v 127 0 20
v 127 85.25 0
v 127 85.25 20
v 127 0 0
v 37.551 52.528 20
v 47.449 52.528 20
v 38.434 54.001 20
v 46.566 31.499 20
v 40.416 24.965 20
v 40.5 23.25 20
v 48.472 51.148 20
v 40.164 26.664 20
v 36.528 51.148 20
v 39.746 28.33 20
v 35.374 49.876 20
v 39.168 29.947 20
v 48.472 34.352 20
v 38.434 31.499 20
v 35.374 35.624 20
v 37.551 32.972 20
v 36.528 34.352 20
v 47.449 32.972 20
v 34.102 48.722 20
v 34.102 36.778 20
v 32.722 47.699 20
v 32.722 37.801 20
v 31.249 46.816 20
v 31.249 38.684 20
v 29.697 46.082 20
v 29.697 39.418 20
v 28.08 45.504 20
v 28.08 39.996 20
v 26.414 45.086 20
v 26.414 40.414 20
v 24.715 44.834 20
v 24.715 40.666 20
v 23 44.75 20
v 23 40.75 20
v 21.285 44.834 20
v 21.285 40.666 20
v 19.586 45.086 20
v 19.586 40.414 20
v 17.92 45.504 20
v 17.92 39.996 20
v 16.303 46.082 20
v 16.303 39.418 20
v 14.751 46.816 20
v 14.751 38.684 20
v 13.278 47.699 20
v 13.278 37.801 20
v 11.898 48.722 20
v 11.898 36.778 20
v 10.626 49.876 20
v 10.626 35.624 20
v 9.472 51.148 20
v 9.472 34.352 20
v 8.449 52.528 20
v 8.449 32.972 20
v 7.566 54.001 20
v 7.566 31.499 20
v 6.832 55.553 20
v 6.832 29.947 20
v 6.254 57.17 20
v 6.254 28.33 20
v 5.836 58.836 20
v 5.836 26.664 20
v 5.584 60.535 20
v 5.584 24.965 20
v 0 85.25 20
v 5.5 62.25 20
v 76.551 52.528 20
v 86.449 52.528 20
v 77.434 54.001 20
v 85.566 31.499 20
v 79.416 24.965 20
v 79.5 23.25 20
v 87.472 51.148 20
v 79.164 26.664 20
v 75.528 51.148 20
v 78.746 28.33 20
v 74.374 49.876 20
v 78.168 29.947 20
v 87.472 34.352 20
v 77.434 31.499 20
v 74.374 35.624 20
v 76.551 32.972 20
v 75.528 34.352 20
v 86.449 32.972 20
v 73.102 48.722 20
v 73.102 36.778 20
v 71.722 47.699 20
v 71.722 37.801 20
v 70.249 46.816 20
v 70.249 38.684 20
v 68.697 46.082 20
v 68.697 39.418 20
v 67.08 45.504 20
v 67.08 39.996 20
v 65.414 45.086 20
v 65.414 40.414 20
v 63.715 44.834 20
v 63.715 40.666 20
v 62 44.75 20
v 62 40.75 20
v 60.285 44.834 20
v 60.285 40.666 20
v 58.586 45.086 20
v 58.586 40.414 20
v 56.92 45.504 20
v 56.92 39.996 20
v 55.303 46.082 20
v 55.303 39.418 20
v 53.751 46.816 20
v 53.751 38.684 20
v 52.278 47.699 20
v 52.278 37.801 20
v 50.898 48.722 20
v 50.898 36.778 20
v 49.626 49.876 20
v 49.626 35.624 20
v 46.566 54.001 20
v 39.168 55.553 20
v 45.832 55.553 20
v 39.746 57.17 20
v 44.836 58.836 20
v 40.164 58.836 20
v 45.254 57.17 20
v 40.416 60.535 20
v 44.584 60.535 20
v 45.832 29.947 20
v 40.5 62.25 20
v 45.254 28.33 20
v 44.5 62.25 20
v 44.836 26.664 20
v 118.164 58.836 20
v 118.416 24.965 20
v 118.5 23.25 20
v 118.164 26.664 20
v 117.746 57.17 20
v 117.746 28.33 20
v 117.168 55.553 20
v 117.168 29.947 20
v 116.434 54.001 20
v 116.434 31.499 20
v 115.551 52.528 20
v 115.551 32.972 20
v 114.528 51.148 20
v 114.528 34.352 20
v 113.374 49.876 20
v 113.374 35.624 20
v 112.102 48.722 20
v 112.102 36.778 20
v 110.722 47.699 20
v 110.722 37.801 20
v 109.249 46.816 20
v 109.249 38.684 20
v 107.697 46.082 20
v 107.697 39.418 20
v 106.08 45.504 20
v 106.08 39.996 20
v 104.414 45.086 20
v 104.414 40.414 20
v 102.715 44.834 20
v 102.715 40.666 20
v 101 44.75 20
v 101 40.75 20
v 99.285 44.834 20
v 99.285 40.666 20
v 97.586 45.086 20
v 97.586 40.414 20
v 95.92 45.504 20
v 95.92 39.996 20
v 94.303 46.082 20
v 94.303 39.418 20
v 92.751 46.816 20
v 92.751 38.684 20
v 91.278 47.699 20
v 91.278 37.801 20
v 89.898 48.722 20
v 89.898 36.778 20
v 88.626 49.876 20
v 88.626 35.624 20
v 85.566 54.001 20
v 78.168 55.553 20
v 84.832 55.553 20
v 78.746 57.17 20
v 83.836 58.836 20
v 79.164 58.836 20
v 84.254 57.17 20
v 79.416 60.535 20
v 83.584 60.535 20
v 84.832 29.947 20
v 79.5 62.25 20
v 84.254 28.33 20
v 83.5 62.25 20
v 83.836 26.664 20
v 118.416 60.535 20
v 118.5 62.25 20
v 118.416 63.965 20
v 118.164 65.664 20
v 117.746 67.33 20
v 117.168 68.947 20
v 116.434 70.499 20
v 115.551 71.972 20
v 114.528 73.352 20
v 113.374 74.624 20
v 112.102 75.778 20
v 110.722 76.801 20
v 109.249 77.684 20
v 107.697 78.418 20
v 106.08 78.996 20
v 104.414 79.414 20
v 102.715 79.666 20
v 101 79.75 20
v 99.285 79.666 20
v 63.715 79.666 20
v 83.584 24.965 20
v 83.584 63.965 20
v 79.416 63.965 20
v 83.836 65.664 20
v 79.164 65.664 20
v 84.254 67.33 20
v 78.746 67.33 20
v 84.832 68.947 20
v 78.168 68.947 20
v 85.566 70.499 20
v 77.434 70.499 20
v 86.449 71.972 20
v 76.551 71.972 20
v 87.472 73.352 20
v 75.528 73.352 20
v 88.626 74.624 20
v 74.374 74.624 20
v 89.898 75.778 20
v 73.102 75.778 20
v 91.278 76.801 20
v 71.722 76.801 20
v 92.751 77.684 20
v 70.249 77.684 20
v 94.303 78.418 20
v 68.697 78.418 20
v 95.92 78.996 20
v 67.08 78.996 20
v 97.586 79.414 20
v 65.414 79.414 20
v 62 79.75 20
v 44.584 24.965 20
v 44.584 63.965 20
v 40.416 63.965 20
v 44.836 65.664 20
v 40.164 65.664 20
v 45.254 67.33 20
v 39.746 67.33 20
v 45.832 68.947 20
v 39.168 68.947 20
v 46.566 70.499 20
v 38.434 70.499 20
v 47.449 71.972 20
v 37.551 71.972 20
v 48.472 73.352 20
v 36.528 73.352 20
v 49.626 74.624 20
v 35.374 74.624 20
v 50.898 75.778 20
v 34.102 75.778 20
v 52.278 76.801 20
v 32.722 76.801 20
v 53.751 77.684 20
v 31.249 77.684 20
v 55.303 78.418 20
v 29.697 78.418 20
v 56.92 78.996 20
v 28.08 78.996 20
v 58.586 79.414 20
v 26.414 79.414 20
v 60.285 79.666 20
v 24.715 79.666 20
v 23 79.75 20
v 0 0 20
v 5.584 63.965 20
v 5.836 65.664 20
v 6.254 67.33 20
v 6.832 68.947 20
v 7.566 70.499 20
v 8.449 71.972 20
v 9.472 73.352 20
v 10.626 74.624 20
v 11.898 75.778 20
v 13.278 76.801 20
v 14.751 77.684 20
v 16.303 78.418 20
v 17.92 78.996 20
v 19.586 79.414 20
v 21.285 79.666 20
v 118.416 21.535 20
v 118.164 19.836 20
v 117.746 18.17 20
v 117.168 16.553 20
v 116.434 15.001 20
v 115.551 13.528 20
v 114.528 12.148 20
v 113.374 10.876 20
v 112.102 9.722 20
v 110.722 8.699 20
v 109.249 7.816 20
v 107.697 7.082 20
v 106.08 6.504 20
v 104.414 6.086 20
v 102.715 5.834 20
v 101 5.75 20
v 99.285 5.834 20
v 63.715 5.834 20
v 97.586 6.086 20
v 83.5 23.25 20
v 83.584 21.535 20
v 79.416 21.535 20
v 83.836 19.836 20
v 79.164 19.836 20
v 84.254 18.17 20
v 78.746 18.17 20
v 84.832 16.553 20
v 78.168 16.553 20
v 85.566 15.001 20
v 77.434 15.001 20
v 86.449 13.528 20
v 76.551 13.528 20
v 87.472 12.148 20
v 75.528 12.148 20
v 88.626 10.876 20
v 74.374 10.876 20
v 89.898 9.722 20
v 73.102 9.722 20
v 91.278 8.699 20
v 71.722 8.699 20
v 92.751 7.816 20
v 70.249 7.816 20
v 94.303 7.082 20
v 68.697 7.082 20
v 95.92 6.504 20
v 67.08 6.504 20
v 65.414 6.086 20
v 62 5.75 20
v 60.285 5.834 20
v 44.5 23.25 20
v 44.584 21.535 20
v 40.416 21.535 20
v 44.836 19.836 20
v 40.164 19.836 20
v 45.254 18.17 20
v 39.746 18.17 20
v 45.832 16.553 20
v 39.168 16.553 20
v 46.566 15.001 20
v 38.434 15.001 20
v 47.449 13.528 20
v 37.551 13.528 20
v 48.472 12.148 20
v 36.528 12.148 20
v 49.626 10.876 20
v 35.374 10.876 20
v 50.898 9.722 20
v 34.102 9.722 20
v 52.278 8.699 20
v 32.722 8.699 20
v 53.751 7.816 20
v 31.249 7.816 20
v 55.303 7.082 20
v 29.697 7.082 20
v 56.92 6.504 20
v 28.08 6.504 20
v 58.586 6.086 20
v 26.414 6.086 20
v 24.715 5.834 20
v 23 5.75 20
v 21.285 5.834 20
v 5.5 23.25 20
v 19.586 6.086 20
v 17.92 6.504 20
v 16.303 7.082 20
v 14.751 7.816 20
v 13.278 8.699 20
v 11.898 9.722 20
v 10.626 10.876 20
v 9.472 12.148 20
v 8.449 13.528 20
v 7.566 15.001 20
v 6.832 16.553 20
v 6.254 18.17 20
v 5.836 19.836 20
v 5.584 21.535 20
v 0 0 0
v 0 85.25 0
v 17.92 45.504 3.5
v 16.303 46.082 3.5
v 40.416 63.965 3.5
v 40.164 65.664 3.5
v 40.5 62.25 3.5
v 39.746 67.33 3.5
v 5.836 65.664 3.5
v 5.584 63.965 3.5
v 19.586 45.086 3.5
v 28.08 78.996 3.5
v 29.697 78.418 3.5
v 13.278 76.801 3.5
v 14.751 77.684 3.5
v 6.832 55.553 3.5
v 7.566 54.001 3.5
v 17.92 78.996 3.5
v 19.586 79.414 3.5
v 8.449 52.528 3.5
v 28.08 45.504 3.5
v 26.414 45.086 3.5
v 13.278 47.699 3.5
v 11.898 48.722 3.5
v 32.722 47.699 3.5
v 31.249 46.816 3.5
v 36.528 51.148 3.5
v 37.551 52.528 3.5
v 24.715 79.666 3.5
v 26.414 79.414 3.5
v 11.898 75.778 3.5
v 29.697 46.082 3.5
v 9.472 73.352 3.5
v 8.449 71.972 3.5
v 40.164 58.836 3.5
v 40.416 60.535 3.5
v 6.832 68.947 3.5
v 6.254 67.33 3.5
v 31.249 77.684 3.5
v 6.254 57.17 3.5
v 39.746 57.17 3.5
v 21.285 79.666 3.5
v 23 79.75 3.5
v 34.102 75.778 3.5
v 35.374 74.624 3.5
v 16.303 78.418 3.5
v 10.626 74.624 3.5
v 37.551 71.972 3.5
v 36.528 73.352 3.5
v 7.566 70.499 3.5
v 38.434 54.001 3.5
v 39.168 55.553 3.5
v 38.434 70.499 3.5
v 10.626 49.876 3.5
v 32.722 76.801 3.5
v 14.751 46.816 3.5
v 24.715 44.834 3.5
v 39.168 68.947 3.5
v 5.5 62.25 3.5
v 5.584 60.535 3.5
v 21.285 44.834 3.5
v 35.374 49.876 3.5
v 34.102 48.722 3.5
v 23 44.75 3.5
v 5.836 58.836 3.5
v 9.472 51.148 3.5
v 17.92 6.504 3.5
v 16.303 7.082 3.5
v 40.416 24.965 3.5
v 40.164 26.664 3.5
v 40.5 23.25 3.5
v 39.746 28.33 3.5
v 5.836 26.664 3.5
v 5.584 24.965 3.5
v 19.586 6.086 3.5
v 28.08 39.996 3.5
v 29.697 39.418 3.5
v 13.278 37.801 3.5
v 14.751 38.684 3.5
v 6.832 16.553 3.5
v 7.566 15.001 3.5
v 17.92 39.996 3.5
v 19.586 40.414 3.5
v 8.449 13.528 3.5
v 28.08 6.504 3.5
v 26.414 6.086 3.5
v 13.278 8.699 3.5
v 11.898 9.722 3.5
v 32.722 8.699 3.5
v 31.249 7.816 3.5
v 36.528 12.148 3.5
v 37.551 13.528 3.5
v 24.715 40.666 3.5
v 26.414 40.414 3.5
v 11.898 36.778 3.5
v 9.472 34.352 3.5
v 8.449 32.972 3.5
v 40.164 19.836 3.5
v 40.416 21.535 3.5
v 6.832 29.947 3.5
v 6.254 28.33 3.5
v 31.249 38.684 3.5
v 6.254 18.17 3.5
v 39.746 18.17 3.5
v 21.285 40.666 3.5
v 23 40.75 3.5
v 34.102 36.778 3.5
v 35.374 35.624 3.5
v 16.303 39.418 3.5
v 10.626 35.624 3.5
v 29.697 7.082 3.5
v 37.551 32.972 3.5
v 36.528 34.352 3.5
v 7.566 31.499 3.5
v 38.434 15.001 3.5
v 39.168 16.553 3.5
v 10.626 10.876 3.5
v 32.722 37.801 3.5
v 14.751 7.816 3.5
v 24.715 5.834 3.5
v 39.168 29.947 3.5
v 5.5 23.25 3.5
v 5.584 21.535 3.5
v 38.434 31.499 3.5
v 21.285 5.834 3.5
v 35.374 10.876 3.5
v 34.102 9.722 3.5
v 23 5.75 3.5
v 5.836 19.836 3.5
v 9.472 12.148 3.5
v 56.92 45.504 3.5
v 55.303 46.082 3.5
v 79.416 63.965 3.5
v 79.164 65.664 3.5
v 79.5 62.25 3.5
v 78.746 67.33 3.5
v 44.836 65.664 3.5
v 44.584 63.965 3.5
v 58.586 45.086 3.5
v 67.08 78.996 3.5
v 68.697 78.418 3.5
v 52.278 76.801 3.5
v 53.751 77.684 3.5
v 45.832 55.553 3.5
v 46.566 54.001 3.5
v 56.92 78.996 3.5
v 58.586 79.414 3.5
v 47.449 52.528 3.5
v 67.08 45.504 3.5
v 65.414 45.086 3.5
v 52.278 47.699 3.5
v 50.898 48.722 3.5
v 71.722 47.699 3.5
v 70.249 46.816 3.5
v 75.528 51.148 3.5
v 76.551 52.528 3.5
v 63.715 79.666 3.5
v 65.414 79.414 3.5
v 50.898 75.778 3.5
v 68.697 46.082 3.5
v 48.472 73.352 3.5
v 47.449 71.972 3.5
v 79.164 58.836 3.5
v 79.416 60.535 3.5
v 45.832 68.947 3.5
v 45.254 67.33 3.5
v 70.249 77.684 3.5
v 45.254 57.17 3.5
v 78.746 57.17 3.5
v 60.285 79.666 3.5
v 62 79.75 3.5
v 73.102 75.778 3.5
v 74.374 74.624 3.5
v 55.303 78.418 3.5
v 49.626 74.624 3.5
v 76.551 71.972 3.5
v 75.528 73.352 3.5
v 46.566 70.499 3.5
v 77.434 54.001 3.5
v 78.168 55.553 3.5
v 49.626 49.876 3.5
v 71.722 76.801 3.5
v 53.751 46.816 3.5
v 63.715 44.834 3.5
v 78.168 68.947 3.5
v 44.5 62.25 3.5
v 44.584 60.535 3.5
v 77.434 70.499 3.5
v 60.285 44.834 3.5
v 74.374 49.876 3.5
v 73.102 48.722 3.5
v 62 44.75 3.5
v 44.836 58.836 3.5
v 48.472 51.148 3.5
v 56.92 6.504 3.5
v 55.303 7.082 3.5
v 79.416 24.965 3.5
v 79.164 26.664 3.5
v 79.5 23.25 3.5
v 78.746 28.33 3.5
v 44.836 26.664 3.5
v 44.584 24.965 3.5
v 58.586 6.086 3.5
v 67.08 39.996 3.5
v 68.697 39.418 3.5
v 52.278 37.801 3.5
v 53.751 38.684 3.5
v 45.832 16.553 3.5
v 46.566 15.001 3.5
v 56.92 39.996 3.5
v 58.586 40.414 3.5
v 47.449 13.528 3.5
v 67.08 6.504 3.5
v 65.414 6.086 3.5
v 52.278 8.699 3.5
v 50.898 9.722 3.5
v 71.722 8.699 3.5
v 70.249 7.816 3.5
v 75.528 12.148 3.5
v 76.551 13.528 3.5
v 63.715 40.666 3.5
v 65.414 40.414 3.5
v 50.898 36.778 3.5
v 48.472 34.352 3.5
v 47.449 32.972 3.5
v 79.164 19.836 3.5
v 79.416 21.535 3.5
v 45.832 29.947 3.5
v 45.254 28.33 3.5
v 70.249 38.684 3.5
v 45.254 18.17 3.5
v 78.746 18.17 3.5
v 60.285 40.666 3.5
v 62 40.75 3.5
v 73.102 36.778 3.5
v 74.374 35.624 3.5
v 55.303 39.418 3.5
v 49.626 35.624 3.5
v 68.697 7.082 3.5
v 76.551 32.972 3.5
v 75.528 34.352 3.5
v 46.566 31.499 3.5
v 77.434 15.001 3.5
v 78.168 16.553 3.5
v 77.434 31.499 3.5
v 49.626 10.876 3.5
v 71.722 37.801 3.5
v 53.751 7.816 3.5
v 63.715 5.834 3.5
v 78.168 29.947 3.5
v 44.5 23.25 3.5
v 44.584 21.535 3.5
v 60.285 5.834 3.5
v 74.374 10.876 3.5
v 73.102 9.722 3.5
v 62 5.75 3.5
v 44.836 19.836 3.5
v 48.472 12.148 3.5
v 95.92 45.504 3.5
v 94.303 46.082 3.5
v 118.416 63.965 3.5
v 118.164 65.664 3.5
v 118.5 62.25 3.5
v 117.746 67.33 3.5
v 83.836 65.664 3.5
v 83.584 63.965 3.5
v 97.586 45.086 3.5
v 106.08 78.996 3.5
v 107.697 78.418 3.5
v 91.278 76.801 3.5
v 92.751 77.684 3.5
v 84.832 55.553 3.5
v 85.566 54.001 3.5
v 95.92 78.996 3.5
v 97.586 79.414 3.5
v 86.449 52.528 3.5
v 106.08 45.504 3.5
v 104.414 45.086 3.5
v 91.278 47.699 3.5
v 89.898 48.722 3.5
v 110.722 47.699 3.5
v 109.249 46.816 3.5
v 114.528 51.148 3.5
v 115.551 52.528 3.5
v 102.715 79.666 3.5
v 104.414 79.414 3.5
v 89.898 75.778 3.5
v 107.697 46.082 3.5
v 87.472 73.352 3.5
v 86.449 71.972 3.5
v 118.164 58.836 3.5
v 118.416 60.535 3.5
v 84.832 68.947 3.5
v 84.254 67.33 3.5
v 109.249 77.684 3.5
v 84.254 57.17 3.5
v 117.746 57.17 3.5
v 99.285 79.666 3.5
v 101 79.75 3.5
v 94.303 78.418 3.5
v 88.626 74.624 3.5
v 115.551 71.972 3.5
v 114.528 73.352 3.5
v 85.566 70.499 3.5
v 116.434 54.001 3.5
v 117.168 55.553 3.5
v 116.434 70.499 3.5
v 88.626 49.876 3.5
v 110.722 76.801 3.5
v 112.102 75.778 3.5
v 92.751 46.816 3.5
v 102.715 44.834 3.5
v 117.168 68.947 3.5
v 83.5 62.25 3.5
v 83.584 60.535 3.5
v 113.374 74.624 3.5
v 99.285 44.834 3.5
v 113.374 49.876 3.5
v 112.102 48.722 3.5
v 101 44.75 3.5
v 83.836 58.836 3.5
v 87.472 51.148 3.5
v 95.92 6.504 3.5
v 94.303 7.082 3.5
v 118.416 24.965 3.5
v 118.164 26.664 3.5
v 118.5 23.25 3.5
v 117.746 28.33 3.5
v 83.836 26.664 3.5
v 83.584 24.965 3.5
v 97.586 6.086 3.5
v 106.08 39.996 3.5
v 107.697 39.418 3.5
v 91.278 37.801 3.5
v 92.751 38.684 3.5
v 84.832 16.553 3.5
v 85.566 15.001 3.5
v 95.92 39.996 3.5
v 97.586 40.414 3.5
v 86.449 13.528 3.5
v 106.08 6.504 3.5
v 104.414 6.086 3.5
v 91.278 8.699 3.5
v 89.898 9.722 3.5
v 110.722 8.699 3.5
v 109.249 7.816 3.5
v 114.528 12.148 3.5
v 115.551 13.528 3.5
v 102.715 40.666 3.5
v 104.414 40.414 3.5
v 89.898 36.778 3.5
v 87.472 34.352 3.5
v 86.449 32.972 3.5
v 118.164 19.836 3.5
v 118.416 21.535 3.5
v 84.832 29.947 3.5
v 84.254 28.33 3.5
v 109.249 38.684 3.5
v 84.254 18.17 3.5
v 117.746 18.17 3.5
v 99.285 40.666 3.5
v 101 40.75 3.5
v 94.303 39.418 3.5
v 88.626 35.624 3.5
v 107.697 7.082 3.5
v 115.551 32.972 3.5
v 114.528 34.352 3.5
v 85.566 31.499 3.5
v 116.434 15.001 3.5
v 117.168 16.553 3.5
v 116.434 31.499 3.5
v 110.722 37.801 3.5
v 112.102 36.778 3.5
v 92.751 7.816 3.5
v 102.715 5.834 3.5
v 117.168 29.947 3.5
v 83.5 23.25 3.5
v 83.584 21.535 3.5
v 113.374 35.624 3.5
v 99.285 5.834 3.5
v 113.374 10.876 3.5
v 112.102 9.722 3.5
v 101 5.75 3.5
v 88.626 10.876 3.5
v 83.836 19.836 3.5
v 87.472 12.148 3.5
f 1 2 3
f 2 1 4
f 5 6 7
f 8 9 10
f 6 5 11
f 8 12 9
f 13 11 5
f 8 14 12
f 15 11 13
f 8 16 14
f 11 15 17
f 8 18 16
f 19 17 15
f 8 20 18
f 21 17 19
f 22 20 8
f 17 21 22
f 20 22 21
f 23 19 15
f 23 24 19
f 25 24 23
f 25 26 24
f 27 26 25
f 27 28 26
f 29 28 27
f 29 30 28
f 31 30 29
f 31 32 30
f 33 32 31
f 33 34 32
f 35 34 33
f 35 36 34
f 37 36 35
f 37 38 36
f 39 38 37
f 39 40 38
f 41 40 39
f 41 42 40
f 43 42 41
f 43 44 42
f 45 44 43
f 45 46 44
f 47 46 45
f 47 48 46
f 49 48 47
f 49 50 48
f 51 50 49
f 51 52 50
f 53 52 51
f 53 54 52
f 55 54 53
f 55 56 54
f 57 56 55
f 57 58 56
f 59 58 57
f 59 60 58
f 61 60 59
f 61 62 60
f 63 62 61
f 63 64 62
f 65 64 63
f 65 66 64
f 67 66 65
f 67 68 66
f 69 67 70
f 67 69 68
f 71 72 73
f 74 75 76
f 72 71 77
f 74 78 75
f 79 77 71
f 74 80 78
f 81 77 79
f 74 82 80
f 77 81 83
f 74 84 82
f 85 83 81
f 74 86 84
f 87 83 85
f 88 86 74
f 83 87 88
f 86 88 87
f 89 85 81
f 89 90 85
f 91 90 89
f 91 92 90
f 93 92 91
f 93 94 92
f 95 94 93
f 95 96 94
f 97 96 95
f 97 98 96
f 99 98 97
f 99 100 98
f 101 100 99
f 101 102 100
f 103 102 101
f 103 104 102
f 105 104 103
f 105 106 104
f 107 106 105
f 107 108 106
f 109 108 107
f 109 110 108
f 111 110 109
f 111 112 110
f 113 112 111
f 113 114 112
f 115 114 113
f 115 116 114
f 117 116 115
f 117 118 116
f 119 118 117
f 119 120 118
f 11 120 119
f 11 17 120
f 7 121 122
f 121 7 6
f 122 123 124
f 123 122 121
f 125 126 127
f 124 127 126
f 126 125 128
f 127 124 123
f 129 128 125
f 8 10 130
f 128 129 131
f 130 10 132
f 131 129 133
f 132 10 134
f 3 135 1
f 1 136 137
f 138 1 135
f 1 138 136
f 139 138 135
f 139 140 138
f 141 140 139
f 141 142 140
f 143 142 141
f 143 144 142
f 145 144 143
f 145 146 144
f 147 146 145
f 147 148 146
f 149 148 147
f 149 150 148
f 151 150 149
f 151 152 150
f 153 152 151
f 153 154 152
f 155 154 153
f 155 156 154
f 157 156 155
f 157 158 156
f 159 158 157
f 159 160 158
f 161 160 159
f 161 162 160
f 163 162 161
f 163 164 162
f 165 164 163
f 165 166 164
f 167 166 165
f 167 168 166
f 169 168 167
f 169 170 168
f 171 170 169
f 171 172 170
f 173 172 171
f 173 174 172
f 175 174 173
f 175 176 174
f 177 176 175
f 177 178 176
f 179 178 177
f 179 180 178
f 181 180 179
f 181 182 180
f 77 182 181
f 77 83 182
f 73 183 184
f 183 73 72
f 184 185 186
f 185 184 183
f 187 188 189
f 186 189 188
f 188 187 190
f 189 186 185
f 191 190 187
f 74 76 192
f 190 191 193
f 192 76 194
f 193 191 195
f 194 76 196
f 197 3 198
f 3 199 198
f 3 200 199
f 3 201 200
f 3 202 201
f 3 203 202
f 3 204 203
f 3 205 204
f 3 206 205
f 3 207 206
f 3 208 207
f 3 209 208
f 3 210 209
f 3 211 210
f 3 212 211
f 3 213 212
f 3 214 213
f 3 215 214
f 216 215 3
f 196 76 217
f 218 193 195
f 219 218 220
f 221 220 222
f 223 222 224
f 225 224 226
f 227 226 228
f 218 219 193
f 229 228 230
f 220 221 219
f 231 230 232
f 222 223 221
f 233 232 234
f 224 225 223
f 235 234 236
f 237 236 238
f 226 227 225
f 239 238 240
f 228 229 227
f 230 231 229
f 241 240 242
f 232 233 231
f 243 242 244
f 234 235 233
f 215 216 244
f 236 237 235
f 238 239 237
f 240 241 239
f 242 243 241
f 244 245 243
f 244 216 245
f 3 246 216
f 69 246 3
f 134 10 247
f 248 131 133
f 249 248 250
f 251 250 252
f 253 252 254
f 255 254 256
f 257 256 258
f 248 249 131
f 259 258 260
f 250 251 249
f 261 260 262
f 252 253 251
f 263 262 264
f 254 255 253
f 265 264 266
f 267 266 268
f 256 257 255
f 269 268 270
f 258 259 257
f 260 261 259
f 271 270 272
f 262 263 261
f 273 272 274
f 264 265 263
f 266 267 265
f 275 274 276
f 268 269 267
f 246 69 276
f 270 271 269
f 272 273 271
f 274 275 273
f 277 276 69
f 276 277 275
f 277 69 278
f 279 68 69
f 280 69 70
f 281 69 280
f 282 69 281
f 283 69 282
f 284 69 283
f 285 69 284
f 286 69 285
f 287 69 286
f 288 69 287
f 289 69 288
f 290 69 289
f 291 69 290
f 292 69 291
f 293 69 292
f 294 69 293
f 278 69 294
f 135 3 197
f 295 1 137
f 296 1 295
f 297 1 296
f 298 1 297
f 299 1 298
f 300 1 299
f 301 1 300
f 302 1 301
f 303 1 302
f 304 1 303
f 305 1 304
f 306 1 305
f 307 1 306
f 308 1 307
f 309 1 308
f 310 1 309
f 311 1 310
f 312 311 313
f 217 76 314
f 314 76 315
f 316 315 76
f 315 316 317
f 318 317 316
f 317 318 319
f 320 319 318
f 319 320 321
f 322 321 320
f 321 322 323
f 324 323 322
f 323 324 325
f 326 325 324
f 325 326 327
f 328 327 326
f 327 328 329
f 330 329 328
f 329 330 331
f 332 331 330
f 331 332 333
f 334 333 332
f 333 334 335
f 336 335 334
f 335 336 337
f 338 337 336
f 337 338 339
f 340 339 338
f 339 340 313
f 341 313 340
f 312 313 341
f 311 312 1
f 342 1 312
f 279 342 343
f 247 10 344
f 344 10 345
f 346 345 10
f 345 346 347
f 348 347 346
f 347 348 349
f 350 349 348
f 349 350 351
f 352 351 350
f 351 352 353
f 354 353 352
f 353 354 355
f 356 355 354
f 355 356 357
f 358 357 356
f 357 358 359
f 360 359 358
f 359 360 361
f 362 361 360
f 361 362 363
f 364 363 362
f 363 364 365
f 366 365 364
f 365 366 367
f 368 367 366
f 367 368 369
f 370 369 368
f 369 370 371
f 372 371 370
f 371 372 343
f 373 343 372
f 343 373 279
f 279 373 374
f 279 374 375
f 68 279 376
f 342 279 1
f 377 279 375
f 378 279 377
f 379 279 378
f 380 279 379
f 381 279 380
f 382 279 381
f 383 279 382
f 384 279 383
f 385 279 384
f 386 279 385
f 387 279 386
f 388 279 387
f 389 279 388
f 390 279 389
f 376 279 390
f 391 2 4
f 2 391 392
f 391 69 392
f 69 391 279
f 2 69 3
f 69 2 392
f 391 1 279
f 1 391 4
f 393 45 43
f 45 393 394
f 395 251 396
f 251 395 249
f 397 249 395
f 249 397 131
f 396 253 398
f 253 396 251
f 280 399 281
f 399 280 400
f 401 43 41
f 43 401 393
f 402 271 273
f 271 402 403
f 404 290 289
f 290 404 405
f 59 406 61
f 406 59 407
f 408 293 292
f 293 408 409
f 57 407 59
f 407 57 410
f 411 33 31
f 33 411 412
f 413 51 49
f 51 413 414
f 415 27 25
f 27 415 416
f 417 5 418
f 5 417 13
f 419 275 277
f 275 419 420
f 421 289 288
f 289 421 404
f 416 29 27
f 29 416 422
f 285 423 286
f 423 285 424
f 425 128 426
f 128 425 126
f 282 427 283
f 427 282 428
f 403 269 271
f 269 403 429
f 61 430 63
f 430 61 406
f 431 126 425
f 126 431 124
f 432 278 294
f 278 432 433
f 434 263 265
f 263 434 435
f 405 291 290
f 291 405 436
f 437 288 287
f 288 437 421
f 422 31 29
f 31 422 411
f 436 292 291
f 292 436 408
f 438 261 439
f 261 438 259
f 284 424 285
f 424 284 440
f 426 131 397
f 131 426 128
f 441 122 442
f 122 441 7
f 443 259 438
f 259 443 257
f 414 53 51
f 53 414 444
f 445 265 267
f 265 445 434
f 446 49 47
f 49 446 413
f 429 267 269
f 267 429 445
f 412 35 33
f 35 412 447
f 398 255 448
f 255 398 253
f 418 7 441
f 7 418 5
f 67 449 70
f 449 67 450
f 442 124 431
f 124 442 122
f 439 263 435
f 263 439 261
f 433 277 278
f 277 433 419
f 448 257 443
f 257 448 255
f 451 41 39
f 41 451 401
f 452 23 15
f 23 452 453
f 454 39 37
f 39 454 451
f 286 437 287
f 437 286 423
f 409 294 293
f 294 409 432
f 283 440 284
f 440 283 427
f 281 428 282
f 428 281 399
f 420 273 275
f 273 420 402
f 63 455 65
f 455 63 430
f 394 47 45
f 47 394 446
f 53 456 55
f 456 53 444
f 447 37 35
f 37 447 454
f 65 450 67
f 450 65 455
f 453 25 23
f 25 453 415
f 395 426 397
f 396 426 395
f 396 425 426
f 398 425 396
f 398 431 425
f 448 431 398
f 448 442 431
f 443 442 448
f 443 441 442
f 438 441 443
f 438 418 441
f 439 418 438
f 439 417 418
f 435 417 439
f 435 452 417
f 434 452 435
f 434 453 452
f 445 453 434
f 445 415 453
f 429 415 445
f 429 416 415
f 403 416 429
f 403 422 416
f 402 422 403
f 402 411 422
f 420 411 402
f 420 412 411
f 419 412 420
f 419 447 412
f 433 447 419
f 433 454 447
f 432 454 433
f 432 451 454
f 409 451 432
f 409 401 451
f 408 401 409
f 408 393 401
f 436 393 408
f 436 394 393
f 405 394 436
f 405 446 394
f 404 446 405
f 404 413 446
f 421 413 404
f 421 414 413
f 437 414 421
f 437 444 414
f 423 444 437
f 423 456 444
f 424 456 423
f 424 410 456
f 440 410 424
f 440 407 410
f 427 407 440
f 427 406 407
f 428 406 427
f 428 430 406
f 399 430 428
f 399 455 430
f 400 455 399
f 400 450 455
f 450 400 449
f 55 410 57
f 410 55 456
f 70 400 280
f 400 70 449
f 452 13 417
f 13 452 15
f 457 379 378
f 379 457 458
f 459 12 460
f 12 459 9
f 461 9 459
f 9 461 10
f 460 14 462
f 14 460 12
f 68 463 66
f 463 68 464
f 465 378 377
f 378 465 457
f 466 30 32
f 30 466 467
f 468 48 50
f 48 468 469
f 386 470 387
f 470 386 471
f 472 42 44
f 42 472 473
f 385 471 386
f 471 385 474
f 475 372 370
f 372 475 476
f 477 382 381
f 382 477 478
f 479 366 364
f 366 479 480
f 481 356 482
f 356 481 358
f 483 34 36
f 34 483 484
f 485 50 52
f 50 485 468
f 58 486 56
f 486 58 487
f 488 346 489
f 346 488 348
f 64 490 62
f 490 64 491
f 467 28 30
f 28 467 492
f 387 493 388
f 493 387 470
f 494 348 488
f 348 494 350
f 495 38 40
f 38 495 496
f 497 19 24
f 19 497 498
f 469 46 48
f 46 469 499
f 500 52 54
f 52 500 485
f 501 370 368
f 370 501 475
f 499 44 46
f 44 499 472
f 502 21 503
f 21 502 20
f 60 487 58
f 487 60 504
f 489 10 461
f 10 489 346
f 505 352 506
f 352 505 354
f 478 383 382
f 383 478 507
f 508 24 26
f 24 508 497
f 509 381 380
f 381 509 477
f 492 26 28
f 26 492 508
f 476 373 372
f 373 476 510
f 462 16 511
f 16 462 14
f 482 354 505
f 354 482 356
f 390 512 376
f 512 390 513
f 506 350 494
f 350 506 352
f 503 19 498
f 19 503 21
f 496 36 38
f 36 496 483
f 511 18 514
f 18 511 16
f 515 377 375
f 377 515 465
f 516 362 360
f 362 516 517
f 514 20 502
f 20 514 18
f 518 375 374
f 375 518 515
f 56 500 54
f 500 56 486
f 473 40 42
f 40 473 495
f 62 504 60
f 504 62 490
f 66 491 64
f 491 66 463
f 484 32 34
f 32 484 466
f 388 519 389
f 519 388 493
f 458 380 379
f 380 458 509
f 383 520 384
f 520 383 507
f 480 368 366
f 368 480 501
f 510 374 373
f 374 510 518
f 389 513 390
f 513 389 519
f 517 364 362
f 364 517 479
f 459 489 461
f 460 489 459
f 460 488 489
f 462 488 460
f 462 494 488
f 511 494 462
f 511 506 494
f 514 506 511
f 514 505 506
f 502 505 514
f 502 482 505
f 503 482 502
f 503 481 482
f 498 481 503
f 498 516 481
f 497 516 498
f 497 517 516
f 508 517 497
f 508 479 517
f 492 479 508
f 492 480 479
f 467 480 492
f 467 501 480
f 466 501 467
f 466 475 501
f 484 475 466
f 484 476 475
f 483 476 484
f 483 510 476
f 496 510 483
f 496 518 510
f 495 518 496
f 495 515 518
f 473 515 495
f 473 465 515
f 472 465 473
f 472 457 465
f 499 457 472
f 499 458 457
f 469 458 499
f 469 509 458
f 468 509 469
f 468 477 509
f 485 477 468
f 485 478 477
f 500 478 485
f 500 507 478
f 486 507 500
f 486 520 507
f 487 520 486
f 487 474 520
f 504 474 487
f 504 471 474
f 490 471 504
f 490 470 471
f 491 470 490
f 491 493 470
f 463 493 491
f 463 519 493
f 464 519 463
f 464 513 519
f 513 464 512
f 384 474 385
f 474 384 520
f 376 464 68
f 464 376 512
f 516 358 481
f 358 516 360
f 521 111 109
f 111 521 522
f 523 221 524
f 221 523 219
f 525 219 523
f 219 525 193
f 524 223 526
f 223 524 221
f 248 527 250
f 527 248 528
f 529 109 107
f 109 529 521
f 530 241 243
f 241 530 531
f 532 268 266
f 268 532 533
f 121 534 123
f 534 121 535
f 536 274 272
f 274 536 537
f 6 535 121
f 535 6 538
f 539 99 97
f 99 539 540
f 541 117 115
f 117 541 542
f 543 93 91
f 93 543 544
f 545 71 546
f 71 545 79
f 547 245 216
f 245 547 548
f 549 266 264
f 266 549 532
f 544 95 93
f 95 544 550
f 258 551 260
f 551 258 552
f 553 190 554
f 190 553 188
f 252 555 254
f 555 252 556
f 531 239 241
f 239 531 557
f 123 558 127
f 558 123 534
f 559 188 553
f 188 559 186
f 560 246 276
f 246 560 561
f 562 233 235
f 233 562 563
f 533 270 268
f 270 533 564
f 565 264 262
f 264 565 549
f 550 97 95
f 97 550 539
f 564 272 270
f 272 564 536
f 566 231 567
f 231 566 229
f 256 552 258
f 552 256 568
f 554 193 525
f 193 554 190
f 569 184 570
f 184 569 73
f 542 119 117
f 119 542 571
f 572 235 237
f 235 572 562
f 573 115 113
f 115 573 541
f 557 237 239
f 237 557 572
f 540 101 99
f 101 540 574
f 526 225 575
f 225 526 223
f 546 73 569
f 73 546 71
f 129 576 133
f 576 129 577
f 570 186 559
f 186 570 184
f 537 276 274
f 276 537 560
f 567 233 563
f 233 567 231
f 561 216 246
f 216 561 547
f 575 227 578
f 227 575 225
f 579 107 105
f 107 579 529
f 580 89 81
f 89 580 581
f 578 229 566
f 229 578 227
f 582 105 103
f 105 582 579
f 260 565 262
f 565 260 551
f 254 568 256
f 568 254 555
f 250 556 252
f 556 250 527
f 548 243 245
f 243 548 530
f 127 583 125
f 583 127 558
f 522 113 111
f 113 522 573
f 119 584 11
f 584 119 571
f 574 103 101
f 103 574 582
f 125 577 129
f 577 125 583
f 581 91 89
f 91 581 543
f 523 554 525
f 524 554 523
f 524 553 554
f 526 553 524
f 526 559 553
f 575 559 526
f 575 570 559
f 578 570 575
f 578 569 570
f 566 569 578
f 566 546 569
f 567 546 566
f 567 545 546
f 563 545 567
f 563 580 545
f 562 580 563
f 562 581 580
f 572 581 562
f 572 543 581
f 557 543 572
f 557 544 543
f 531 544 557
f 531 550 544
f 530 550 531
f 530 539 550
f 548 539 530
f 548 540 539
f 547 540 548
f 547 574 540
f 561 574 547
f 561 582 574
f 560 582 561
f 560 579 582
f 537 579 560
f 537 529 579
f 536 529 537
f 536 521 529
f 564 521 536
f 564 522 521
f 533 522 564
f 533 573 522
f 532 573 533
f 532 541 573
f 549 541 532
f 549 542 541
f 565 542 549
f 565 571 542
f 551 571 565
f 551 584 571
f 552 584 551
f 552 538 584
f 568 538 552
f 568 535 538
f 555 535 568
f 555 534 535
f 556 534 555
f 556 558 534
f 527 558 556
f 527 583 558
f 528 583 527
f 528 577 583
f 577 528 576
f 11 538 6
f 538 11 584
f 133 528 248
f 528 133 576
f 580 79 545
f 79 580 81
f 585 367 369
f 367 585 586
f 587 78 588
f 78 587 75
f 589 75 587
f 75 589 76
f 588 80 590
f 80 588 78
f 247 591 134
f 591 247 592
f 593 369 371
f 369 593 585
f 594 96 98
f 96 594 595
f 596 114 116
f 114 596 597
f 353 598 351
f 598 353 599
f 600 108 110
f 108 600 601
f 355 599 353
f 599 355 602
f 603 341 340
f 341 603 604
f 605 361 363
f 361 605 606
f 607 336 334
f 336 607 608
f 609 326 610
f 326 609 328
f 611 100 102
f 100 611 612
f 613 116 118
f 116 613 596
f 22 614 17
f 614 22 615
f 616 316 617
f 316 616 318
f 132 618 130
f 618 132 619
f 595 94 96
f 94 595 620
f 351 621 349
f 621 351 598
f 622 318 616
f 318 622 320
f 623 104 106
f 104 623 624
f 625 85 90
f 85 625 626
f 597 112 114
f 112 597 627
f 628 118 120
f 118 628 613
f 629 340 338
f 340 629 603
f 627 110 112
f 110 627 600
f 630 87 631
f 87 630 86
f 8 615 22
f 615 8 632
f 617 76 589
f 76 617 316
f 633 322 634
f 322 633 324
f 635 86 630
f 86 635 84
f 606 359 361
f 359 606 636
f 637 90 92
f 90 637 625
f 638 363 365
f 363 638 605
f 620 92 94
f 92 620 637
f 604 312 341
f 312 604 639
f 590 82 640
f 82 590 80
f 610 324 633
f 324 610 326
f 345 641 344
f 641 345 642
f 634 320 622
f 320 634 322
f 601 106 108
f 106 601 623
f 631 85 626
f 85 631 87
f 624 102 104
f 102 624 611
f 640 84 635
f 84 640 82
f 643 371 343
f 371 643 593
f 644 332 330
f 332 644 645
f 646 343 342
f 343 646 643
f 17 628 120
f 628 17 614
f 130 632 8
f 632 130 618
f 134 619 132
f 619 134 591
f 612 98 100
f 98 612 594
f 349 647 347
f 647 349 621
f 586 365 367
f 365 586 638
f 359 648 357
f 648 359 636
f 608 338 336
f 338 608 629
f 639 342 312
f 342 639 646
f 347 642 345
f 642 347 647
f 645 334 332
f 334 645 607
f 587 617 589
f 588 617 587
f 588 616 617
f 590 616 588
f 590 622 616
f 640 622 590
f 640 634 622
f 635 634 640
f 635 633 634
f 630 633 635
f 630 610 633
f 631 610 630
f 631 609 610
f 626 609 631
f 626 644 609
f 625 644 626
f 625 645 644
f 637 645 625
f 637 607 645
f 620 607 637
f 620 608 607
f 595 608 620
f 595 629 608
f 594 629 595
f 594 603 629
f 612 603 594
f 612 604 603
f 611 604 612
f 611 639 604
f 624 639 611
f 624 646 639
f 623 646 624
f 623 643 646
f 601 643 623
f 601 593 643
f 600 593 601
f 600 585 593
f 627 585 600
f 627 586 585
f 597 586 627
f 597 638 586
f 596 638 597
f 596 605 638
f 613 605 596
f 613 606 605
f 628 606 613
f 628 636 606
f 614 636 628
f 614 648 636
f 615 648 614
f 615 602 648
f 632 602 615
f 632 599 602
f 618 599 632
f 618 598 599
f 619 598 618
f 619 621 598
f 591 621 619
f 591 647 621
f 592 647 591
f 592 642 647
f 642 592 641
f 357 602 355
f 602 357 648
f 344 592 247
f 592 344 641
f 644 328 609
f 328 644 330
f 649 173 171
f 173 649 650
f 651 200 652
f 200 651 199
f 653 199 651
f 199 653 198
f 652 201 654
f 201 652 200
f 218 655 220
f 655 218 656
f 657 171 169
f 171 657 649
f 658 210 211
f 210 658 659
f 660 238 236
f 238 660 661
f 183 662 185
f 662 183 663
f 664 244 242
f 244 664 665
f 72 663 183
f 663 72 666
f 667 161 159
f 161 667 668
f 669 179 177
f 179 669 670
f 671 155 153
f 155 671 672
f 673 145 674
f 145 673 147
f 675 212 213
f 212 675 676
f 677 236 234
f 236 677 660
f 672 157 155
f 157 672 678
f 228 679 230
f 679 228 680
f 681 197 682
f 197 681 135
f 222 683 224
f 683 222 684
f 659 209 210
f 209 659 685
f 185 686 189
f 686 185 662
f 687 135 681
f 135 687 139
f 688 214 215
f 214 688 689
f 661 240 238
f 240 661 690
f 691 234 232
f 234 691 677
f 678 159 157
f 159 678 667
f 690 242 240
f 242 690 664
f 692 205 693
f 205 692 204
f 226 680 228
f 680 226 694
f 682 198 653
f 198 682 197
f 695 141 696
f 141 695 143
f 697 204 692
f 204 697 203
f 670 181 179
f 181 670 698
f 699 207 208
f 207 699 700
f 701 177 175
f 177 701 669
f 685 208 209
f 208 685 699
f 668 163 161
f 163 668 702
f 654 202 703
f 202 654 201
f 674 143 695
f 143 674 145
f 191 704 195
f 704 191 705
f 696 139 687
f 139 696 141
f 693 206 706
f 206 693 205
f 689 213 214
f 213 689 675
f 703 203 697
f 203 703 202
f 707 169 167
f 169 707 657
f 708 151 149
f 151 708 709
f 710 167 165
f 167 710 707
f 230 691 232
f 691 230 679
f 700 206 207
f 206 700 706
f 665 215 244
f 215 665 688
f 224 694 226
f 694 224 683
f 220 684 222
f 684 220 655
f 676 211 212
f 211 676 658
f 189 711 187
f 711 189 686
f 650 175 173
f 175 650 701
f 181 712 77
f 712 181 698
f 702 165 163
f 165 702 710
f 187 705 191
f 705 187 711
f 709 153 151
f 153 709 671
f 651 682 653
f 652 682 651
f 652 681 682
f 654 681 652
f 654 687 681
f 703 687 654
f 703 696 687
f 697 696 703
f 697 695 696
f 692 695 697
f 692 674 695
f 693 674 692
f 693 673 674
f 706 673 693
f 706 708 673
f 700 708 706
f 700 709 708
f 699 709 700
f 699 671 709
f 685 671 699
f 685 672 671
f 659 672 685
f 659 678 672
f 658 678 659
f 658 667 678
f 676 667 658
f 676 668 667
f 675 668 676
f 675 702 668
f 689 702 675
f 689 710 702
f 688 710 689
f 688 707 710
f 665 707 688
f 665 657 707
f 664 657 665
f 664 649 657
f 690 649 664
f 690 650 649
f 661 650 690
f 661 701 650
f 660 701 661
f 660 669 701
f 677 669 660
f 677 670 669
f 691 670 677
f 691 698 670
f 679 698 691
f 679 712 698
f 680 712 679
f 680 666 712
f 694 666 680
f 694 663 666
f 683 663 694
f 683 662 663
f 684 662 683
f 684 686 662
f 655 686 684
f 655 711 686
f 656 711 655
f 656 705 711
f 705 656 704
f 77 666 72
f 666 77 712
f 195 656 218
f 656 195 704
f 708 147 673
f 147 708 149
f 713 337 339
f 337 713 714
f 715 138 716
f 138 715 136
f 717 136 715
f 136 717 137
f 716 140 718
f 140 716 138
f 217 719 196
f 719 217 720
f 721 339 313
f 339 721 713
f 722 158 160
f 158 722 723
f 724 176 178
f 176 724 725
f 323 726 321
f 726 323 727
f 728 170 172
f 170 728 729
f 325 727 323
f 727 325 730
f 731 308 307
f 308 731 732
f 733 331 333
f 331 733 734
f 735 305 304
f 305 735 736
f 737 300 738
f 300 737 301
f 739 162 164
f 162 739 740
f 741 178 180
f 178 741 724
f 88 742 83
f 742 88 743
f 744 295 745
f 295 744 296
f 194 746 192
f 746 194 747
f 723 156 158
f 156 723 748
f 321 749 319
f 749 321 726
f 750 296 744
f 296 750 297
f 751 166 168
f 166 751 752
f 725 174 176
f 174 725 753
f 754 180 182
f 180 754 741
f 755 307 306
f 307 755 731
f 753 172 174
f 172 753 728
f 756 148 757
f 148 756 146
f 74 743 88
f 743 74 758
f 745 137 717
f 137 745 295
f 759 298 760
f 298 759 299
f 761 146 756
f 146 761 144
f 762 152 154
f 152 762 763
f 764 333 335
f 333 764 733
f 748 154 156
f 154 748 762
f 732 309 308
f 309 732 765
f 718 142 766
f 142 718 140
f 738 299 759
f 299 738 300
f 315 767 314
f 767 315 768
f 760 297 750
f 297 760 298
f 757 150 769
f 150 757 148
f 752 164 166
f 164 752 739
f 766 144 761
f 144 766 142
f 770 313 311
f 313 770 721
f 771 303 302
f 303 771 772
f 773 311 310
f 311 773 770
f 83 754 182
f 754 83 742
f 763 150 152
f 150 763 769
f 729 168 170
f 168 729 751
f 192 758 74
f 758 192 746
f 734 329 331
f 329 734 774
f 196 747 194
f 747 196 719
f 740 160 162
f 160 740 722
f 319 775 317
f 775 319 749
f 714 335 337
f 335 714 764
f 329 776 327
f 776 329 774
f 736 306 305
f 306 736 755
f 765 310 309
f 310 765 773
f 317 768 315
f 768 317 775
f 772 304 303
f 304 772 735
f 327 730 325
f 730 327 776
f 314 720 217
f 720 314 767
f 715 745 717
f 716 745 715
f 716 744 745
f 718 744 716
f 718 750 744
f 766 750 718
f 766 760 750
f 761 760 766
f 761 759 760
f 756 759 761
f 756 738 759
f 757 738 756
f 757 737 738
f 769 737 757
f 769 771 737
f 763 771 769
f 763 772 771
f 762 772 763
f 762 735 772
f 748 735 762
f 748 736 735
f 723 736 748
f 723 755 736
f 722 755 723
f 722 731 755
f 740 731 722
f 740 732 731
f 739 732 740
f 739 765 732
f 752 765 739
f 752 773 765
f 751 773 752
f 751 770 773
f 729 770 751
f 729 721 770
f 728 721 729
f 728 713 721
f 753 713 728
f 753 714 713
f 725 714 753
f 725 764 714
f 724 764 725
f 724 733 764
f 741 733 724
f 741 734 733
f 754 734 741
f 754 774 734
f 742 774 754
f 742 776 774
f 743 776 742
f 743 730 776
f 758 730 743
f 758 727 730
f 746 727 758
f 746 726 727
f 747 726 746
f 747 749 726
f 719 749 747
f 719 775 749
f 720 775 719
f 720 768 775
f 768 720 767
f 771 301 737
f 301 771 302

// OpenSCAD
// Scienfocus 6 Well Plate 15900 µL
// loadName: scienfocus_6_wellplate_15900ul
// Auto-generated by labware_to_stl.py from Opentrons V2 labware definition

$fn = 64;

difference() {
    // ── Labware body ──────────────────────────────────────────────
    cube([127.0000, 85.2500, 20.0000]);

    // ── Well cutouts ──────────────────────────────────────────────
    // Well A1
    translate([23.0000, 62.2500, 3.5000])
        cylinder(h=17.5000, r=17.5000, $fn=$fn);
    // Well B1
    translate([23.0000, 23.2500, 3.5000])
        cylinder(h=17.5000, r=17.5000, $fn=$fn);
    // Well A2
    translate([62.0000, 62.2500, 3.5000])
        cylinder(h=17.5000, r=17.5000, $fn=$fn);
    // Well B2
    translate([62.0000, 23.2500, 3.5000])
        cylinder(h=17.5000, r=17.5000, $fn=$fn);
    // Well A3
    translate([101.0000, 62.2500, 3.5000])
        cylinder(h=17.5000, r=17.5000, $fn=$fn);
    // Well B3
    translate([101.0000, 23.2500, 3.5000])
        cylinder(h=17.5000, r=17.5000, $fn=$fn);
}
